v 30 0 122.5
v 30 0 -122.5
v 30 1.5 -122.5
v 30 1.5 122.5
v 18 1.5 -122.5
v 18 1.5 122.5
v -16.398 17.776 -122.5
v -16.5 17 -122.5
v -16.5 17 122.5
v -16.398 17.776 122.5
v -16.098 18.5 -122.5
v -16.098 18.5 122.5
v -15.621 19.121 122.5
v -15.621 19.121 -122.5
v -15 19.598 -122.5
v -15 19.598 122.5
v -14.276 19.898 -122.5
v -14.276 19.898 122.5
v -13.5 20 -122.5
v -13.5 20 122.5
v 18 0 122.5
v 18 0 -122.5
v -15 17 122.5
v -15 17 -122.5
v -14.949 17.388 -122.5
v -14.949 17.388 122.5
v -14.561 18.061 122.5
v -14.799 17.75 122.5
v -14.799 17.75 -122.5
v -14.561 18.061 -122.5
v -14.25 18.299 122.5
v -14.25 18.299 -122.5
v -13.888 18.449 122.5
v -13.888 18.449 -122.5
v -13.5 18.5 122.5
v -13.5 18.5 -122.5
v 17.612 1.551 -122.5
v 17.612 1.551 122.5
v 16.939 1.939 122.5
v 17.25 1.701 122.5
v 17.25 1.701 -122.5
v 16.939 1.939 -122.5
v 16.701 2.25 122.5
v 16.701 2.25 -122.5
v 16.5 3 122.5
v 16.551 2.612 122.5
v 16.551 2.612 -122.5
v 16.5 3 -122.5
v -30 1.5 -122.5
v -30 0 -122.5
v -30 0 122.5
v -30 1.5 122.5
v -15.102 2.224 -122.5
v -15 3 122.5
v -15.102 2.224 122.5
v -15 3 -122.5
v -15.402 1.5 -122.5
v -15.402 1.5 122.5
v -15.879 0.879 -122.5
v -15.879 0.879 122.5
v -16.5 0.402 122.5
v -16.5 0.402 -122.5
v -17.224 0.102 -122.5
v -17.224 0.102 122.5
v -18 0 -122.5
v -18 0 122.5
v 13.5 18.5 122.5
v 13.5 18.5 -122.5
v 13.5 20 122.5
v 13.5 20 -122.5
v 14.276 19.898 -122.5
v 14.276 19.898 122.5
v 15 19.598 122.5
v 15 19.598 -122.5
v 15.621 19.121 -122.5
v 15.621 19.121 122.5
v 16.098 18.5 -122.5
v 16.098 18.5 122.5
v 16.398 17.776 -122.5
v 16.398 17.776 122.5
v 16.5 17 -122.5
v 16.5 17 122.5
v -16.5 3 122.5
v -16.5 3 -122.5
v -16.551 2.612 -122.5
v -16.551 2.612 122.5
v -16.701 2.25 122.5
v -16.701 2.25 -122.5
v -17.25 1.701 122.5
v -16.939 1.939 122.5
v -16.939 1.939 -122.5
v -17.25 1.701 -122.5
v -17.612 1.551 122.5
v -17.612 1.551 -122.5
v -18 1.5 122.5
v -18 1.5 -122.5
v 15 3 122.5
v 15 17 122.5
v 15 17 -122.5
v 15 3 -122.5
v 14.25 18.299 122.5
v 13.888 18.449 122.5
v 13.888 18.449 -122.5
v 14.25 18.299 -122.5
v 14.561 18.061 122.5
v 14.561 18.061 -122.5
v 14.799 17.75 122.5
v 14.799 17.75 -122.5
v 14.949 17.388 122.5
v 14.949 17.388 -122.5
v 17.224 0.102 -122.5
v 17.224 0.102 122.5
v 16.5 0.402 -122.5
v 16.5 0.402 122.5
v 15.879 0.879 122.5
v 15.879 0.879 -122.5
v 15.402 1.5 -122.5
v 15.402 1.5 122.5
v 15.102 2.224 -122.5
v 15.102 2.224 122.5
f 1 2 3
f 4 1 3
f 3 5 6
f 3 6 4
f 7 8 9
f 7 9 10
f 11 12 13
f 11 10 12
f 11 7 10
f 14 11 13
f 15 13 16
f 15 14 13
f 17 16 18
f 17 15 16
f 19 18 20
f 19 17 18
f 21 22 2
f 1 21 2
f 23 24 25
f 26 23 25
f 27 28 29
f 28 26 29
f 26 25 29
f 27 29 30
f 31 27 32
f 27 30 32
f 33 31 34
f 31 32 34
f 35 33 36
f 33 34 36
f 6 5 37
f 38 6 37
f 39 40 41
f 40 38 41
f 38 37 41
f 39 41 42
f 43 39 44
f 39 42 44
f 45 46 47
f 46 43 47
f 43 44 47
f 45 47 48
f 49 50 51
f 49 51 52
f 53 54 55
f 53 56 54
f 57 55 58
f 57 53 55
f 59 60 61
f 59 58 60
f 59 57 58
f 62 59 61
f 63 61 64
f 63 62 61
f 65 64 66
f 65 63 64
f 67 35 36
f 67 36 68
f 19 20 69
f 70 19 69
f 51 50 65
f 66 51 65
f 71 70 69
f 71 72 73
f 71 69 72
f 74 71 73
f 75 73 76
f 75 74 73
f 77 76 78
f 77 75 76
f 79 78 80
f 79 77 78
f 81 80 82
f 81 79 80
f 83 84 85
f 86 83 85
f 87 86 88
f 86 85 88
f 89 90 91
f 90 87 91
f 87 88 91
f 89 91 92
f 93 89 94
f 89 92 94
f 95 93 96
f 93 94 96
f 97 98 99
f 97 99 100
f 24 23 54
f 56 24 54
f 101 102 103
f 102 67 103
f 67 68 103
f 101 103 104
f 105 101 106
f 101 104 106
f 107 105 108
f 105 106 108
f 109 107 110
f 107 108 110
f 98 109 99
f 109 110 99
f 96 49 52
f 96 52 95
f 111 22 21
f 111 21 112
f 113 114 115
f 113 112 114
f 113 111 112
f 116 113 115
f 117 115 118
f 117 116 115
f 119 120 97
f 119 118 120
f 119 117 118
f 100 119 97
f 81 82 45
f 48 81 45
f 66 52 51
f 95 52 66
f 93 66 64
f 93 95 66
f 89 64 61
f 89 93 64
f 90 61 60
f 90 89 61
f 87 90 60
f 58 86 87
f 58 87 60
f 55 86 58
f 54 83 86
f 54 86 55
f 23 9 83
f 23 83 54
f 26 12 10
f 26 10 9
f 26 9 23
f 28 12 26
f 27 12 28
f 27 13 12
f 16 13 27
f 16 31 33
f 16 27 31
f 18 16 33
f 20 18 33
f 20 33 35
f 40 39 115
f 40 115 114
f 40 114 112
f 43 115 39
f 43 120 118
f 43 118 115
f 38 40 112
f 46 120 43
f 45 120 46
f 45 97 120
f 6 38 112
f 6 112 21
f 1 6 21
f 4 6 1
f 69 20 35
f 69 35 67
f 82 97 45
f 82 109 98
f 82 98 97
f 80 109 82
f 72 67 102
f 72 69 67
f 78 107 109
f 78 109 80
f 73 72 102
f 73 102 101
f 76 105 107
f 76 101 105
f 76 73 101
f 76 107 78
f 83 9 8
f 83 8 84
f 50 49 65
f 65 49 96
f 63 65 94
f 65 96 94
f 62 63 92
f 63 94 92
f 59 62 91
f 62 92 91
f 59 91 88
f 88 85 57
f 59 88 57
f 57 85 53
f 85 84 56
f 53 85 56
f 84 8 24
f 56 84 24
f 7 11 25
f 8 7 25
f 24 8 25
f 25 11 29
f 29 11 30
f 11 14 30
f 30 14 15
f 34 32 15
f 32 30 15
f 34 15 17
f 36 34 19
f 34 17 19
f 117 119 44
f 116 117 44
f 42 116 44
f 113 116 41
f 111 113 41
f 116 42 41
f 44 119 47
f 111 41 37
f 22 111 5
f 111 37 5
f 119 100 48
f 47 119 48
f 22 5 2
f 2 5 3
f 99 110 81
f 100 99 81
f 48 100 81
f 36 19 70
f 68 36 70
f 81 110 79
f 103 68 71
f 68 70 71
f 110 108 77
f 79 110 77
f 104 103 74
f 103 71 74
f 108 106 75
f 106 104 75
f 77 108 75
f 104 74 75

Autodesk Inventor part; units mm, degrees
ref_plane "YZ Plane" through (0, 0, 0) normal (1, 0, 0) x (0, 1, 0)
ref_plane "XZ Plane" through (0, 0, 0) normal (0, 1, 0) x (-1, 0, 0)
ref_plane "XY Plane" through (0, 0, 0) normal (0, 0, 1) x (1, 0, 0)
sketch "Sketch1" plane through (0, 0, 0) normal (0, 0, 1) x (1, 0, 0)
  line L0 (-15, 18.5) -> (15, 18.5)
  line L1 (-15, 18.5) -> (-15, 0)
  line L2 (15, 18.5) -> (15, 0)
  line L3 (-30, 0) -> (-15, 0)
  line L4 (15, 0) -> (30, 0)
  point P0 (0, 0)
  dimension "d0" = 30
  dimension "d1" = 15
  dimension "d3" = 18.5
  dimension "d4" = 15
  dimension "d5" = 15
contour flange "Contour Flange1" sketch "Sketch1" thickness 1.5 bend radius 1.5 width 245 along (0, 0, 1) mid plane yes both sides no wall seen from (-22.5, 0, 0) lies toward (0, 1, 0) curves L3 L1 L0 L2 L4
bend "Bend1"
corner "Corner1"
equation "\"d6\" = BendReliefWidth"
equation "\"d7\" = BendReliefDepth"
equation "\"d8\" = MinimumRemnant"
equation "\"d9\" = BendRadius"
equation "\"d11\" = BendRadius"
equation "\"d13\" = CornerReliefSize"
equation "\"d14\" = GapSize"
equation "\"d15\" = JacobiRadiusSize"
equation "\"d1\" = 0.5 * d0"
equation "\"BendRadius\" = Thickness"
equation "\"BendReliefWidth\" = Thickness"
equation "\"BendReliefDepth\" = 0.5 * Thickness"
equation "\"CornerReliefSize\" = 4 * Thickness"
equation "\"MinimumRemnant\" = 2 * Thickness"
equation "\"TransitionRadius\" = BendRadius"
equation "\"JacobiRadiusSize\" = BendRadius"
equation "\"GapSize\" = Thickness"
equation "\"Thickness\" = 1.5"
properties part number "Reforço Bandeja" material "Stainless Steel AISI 304"
